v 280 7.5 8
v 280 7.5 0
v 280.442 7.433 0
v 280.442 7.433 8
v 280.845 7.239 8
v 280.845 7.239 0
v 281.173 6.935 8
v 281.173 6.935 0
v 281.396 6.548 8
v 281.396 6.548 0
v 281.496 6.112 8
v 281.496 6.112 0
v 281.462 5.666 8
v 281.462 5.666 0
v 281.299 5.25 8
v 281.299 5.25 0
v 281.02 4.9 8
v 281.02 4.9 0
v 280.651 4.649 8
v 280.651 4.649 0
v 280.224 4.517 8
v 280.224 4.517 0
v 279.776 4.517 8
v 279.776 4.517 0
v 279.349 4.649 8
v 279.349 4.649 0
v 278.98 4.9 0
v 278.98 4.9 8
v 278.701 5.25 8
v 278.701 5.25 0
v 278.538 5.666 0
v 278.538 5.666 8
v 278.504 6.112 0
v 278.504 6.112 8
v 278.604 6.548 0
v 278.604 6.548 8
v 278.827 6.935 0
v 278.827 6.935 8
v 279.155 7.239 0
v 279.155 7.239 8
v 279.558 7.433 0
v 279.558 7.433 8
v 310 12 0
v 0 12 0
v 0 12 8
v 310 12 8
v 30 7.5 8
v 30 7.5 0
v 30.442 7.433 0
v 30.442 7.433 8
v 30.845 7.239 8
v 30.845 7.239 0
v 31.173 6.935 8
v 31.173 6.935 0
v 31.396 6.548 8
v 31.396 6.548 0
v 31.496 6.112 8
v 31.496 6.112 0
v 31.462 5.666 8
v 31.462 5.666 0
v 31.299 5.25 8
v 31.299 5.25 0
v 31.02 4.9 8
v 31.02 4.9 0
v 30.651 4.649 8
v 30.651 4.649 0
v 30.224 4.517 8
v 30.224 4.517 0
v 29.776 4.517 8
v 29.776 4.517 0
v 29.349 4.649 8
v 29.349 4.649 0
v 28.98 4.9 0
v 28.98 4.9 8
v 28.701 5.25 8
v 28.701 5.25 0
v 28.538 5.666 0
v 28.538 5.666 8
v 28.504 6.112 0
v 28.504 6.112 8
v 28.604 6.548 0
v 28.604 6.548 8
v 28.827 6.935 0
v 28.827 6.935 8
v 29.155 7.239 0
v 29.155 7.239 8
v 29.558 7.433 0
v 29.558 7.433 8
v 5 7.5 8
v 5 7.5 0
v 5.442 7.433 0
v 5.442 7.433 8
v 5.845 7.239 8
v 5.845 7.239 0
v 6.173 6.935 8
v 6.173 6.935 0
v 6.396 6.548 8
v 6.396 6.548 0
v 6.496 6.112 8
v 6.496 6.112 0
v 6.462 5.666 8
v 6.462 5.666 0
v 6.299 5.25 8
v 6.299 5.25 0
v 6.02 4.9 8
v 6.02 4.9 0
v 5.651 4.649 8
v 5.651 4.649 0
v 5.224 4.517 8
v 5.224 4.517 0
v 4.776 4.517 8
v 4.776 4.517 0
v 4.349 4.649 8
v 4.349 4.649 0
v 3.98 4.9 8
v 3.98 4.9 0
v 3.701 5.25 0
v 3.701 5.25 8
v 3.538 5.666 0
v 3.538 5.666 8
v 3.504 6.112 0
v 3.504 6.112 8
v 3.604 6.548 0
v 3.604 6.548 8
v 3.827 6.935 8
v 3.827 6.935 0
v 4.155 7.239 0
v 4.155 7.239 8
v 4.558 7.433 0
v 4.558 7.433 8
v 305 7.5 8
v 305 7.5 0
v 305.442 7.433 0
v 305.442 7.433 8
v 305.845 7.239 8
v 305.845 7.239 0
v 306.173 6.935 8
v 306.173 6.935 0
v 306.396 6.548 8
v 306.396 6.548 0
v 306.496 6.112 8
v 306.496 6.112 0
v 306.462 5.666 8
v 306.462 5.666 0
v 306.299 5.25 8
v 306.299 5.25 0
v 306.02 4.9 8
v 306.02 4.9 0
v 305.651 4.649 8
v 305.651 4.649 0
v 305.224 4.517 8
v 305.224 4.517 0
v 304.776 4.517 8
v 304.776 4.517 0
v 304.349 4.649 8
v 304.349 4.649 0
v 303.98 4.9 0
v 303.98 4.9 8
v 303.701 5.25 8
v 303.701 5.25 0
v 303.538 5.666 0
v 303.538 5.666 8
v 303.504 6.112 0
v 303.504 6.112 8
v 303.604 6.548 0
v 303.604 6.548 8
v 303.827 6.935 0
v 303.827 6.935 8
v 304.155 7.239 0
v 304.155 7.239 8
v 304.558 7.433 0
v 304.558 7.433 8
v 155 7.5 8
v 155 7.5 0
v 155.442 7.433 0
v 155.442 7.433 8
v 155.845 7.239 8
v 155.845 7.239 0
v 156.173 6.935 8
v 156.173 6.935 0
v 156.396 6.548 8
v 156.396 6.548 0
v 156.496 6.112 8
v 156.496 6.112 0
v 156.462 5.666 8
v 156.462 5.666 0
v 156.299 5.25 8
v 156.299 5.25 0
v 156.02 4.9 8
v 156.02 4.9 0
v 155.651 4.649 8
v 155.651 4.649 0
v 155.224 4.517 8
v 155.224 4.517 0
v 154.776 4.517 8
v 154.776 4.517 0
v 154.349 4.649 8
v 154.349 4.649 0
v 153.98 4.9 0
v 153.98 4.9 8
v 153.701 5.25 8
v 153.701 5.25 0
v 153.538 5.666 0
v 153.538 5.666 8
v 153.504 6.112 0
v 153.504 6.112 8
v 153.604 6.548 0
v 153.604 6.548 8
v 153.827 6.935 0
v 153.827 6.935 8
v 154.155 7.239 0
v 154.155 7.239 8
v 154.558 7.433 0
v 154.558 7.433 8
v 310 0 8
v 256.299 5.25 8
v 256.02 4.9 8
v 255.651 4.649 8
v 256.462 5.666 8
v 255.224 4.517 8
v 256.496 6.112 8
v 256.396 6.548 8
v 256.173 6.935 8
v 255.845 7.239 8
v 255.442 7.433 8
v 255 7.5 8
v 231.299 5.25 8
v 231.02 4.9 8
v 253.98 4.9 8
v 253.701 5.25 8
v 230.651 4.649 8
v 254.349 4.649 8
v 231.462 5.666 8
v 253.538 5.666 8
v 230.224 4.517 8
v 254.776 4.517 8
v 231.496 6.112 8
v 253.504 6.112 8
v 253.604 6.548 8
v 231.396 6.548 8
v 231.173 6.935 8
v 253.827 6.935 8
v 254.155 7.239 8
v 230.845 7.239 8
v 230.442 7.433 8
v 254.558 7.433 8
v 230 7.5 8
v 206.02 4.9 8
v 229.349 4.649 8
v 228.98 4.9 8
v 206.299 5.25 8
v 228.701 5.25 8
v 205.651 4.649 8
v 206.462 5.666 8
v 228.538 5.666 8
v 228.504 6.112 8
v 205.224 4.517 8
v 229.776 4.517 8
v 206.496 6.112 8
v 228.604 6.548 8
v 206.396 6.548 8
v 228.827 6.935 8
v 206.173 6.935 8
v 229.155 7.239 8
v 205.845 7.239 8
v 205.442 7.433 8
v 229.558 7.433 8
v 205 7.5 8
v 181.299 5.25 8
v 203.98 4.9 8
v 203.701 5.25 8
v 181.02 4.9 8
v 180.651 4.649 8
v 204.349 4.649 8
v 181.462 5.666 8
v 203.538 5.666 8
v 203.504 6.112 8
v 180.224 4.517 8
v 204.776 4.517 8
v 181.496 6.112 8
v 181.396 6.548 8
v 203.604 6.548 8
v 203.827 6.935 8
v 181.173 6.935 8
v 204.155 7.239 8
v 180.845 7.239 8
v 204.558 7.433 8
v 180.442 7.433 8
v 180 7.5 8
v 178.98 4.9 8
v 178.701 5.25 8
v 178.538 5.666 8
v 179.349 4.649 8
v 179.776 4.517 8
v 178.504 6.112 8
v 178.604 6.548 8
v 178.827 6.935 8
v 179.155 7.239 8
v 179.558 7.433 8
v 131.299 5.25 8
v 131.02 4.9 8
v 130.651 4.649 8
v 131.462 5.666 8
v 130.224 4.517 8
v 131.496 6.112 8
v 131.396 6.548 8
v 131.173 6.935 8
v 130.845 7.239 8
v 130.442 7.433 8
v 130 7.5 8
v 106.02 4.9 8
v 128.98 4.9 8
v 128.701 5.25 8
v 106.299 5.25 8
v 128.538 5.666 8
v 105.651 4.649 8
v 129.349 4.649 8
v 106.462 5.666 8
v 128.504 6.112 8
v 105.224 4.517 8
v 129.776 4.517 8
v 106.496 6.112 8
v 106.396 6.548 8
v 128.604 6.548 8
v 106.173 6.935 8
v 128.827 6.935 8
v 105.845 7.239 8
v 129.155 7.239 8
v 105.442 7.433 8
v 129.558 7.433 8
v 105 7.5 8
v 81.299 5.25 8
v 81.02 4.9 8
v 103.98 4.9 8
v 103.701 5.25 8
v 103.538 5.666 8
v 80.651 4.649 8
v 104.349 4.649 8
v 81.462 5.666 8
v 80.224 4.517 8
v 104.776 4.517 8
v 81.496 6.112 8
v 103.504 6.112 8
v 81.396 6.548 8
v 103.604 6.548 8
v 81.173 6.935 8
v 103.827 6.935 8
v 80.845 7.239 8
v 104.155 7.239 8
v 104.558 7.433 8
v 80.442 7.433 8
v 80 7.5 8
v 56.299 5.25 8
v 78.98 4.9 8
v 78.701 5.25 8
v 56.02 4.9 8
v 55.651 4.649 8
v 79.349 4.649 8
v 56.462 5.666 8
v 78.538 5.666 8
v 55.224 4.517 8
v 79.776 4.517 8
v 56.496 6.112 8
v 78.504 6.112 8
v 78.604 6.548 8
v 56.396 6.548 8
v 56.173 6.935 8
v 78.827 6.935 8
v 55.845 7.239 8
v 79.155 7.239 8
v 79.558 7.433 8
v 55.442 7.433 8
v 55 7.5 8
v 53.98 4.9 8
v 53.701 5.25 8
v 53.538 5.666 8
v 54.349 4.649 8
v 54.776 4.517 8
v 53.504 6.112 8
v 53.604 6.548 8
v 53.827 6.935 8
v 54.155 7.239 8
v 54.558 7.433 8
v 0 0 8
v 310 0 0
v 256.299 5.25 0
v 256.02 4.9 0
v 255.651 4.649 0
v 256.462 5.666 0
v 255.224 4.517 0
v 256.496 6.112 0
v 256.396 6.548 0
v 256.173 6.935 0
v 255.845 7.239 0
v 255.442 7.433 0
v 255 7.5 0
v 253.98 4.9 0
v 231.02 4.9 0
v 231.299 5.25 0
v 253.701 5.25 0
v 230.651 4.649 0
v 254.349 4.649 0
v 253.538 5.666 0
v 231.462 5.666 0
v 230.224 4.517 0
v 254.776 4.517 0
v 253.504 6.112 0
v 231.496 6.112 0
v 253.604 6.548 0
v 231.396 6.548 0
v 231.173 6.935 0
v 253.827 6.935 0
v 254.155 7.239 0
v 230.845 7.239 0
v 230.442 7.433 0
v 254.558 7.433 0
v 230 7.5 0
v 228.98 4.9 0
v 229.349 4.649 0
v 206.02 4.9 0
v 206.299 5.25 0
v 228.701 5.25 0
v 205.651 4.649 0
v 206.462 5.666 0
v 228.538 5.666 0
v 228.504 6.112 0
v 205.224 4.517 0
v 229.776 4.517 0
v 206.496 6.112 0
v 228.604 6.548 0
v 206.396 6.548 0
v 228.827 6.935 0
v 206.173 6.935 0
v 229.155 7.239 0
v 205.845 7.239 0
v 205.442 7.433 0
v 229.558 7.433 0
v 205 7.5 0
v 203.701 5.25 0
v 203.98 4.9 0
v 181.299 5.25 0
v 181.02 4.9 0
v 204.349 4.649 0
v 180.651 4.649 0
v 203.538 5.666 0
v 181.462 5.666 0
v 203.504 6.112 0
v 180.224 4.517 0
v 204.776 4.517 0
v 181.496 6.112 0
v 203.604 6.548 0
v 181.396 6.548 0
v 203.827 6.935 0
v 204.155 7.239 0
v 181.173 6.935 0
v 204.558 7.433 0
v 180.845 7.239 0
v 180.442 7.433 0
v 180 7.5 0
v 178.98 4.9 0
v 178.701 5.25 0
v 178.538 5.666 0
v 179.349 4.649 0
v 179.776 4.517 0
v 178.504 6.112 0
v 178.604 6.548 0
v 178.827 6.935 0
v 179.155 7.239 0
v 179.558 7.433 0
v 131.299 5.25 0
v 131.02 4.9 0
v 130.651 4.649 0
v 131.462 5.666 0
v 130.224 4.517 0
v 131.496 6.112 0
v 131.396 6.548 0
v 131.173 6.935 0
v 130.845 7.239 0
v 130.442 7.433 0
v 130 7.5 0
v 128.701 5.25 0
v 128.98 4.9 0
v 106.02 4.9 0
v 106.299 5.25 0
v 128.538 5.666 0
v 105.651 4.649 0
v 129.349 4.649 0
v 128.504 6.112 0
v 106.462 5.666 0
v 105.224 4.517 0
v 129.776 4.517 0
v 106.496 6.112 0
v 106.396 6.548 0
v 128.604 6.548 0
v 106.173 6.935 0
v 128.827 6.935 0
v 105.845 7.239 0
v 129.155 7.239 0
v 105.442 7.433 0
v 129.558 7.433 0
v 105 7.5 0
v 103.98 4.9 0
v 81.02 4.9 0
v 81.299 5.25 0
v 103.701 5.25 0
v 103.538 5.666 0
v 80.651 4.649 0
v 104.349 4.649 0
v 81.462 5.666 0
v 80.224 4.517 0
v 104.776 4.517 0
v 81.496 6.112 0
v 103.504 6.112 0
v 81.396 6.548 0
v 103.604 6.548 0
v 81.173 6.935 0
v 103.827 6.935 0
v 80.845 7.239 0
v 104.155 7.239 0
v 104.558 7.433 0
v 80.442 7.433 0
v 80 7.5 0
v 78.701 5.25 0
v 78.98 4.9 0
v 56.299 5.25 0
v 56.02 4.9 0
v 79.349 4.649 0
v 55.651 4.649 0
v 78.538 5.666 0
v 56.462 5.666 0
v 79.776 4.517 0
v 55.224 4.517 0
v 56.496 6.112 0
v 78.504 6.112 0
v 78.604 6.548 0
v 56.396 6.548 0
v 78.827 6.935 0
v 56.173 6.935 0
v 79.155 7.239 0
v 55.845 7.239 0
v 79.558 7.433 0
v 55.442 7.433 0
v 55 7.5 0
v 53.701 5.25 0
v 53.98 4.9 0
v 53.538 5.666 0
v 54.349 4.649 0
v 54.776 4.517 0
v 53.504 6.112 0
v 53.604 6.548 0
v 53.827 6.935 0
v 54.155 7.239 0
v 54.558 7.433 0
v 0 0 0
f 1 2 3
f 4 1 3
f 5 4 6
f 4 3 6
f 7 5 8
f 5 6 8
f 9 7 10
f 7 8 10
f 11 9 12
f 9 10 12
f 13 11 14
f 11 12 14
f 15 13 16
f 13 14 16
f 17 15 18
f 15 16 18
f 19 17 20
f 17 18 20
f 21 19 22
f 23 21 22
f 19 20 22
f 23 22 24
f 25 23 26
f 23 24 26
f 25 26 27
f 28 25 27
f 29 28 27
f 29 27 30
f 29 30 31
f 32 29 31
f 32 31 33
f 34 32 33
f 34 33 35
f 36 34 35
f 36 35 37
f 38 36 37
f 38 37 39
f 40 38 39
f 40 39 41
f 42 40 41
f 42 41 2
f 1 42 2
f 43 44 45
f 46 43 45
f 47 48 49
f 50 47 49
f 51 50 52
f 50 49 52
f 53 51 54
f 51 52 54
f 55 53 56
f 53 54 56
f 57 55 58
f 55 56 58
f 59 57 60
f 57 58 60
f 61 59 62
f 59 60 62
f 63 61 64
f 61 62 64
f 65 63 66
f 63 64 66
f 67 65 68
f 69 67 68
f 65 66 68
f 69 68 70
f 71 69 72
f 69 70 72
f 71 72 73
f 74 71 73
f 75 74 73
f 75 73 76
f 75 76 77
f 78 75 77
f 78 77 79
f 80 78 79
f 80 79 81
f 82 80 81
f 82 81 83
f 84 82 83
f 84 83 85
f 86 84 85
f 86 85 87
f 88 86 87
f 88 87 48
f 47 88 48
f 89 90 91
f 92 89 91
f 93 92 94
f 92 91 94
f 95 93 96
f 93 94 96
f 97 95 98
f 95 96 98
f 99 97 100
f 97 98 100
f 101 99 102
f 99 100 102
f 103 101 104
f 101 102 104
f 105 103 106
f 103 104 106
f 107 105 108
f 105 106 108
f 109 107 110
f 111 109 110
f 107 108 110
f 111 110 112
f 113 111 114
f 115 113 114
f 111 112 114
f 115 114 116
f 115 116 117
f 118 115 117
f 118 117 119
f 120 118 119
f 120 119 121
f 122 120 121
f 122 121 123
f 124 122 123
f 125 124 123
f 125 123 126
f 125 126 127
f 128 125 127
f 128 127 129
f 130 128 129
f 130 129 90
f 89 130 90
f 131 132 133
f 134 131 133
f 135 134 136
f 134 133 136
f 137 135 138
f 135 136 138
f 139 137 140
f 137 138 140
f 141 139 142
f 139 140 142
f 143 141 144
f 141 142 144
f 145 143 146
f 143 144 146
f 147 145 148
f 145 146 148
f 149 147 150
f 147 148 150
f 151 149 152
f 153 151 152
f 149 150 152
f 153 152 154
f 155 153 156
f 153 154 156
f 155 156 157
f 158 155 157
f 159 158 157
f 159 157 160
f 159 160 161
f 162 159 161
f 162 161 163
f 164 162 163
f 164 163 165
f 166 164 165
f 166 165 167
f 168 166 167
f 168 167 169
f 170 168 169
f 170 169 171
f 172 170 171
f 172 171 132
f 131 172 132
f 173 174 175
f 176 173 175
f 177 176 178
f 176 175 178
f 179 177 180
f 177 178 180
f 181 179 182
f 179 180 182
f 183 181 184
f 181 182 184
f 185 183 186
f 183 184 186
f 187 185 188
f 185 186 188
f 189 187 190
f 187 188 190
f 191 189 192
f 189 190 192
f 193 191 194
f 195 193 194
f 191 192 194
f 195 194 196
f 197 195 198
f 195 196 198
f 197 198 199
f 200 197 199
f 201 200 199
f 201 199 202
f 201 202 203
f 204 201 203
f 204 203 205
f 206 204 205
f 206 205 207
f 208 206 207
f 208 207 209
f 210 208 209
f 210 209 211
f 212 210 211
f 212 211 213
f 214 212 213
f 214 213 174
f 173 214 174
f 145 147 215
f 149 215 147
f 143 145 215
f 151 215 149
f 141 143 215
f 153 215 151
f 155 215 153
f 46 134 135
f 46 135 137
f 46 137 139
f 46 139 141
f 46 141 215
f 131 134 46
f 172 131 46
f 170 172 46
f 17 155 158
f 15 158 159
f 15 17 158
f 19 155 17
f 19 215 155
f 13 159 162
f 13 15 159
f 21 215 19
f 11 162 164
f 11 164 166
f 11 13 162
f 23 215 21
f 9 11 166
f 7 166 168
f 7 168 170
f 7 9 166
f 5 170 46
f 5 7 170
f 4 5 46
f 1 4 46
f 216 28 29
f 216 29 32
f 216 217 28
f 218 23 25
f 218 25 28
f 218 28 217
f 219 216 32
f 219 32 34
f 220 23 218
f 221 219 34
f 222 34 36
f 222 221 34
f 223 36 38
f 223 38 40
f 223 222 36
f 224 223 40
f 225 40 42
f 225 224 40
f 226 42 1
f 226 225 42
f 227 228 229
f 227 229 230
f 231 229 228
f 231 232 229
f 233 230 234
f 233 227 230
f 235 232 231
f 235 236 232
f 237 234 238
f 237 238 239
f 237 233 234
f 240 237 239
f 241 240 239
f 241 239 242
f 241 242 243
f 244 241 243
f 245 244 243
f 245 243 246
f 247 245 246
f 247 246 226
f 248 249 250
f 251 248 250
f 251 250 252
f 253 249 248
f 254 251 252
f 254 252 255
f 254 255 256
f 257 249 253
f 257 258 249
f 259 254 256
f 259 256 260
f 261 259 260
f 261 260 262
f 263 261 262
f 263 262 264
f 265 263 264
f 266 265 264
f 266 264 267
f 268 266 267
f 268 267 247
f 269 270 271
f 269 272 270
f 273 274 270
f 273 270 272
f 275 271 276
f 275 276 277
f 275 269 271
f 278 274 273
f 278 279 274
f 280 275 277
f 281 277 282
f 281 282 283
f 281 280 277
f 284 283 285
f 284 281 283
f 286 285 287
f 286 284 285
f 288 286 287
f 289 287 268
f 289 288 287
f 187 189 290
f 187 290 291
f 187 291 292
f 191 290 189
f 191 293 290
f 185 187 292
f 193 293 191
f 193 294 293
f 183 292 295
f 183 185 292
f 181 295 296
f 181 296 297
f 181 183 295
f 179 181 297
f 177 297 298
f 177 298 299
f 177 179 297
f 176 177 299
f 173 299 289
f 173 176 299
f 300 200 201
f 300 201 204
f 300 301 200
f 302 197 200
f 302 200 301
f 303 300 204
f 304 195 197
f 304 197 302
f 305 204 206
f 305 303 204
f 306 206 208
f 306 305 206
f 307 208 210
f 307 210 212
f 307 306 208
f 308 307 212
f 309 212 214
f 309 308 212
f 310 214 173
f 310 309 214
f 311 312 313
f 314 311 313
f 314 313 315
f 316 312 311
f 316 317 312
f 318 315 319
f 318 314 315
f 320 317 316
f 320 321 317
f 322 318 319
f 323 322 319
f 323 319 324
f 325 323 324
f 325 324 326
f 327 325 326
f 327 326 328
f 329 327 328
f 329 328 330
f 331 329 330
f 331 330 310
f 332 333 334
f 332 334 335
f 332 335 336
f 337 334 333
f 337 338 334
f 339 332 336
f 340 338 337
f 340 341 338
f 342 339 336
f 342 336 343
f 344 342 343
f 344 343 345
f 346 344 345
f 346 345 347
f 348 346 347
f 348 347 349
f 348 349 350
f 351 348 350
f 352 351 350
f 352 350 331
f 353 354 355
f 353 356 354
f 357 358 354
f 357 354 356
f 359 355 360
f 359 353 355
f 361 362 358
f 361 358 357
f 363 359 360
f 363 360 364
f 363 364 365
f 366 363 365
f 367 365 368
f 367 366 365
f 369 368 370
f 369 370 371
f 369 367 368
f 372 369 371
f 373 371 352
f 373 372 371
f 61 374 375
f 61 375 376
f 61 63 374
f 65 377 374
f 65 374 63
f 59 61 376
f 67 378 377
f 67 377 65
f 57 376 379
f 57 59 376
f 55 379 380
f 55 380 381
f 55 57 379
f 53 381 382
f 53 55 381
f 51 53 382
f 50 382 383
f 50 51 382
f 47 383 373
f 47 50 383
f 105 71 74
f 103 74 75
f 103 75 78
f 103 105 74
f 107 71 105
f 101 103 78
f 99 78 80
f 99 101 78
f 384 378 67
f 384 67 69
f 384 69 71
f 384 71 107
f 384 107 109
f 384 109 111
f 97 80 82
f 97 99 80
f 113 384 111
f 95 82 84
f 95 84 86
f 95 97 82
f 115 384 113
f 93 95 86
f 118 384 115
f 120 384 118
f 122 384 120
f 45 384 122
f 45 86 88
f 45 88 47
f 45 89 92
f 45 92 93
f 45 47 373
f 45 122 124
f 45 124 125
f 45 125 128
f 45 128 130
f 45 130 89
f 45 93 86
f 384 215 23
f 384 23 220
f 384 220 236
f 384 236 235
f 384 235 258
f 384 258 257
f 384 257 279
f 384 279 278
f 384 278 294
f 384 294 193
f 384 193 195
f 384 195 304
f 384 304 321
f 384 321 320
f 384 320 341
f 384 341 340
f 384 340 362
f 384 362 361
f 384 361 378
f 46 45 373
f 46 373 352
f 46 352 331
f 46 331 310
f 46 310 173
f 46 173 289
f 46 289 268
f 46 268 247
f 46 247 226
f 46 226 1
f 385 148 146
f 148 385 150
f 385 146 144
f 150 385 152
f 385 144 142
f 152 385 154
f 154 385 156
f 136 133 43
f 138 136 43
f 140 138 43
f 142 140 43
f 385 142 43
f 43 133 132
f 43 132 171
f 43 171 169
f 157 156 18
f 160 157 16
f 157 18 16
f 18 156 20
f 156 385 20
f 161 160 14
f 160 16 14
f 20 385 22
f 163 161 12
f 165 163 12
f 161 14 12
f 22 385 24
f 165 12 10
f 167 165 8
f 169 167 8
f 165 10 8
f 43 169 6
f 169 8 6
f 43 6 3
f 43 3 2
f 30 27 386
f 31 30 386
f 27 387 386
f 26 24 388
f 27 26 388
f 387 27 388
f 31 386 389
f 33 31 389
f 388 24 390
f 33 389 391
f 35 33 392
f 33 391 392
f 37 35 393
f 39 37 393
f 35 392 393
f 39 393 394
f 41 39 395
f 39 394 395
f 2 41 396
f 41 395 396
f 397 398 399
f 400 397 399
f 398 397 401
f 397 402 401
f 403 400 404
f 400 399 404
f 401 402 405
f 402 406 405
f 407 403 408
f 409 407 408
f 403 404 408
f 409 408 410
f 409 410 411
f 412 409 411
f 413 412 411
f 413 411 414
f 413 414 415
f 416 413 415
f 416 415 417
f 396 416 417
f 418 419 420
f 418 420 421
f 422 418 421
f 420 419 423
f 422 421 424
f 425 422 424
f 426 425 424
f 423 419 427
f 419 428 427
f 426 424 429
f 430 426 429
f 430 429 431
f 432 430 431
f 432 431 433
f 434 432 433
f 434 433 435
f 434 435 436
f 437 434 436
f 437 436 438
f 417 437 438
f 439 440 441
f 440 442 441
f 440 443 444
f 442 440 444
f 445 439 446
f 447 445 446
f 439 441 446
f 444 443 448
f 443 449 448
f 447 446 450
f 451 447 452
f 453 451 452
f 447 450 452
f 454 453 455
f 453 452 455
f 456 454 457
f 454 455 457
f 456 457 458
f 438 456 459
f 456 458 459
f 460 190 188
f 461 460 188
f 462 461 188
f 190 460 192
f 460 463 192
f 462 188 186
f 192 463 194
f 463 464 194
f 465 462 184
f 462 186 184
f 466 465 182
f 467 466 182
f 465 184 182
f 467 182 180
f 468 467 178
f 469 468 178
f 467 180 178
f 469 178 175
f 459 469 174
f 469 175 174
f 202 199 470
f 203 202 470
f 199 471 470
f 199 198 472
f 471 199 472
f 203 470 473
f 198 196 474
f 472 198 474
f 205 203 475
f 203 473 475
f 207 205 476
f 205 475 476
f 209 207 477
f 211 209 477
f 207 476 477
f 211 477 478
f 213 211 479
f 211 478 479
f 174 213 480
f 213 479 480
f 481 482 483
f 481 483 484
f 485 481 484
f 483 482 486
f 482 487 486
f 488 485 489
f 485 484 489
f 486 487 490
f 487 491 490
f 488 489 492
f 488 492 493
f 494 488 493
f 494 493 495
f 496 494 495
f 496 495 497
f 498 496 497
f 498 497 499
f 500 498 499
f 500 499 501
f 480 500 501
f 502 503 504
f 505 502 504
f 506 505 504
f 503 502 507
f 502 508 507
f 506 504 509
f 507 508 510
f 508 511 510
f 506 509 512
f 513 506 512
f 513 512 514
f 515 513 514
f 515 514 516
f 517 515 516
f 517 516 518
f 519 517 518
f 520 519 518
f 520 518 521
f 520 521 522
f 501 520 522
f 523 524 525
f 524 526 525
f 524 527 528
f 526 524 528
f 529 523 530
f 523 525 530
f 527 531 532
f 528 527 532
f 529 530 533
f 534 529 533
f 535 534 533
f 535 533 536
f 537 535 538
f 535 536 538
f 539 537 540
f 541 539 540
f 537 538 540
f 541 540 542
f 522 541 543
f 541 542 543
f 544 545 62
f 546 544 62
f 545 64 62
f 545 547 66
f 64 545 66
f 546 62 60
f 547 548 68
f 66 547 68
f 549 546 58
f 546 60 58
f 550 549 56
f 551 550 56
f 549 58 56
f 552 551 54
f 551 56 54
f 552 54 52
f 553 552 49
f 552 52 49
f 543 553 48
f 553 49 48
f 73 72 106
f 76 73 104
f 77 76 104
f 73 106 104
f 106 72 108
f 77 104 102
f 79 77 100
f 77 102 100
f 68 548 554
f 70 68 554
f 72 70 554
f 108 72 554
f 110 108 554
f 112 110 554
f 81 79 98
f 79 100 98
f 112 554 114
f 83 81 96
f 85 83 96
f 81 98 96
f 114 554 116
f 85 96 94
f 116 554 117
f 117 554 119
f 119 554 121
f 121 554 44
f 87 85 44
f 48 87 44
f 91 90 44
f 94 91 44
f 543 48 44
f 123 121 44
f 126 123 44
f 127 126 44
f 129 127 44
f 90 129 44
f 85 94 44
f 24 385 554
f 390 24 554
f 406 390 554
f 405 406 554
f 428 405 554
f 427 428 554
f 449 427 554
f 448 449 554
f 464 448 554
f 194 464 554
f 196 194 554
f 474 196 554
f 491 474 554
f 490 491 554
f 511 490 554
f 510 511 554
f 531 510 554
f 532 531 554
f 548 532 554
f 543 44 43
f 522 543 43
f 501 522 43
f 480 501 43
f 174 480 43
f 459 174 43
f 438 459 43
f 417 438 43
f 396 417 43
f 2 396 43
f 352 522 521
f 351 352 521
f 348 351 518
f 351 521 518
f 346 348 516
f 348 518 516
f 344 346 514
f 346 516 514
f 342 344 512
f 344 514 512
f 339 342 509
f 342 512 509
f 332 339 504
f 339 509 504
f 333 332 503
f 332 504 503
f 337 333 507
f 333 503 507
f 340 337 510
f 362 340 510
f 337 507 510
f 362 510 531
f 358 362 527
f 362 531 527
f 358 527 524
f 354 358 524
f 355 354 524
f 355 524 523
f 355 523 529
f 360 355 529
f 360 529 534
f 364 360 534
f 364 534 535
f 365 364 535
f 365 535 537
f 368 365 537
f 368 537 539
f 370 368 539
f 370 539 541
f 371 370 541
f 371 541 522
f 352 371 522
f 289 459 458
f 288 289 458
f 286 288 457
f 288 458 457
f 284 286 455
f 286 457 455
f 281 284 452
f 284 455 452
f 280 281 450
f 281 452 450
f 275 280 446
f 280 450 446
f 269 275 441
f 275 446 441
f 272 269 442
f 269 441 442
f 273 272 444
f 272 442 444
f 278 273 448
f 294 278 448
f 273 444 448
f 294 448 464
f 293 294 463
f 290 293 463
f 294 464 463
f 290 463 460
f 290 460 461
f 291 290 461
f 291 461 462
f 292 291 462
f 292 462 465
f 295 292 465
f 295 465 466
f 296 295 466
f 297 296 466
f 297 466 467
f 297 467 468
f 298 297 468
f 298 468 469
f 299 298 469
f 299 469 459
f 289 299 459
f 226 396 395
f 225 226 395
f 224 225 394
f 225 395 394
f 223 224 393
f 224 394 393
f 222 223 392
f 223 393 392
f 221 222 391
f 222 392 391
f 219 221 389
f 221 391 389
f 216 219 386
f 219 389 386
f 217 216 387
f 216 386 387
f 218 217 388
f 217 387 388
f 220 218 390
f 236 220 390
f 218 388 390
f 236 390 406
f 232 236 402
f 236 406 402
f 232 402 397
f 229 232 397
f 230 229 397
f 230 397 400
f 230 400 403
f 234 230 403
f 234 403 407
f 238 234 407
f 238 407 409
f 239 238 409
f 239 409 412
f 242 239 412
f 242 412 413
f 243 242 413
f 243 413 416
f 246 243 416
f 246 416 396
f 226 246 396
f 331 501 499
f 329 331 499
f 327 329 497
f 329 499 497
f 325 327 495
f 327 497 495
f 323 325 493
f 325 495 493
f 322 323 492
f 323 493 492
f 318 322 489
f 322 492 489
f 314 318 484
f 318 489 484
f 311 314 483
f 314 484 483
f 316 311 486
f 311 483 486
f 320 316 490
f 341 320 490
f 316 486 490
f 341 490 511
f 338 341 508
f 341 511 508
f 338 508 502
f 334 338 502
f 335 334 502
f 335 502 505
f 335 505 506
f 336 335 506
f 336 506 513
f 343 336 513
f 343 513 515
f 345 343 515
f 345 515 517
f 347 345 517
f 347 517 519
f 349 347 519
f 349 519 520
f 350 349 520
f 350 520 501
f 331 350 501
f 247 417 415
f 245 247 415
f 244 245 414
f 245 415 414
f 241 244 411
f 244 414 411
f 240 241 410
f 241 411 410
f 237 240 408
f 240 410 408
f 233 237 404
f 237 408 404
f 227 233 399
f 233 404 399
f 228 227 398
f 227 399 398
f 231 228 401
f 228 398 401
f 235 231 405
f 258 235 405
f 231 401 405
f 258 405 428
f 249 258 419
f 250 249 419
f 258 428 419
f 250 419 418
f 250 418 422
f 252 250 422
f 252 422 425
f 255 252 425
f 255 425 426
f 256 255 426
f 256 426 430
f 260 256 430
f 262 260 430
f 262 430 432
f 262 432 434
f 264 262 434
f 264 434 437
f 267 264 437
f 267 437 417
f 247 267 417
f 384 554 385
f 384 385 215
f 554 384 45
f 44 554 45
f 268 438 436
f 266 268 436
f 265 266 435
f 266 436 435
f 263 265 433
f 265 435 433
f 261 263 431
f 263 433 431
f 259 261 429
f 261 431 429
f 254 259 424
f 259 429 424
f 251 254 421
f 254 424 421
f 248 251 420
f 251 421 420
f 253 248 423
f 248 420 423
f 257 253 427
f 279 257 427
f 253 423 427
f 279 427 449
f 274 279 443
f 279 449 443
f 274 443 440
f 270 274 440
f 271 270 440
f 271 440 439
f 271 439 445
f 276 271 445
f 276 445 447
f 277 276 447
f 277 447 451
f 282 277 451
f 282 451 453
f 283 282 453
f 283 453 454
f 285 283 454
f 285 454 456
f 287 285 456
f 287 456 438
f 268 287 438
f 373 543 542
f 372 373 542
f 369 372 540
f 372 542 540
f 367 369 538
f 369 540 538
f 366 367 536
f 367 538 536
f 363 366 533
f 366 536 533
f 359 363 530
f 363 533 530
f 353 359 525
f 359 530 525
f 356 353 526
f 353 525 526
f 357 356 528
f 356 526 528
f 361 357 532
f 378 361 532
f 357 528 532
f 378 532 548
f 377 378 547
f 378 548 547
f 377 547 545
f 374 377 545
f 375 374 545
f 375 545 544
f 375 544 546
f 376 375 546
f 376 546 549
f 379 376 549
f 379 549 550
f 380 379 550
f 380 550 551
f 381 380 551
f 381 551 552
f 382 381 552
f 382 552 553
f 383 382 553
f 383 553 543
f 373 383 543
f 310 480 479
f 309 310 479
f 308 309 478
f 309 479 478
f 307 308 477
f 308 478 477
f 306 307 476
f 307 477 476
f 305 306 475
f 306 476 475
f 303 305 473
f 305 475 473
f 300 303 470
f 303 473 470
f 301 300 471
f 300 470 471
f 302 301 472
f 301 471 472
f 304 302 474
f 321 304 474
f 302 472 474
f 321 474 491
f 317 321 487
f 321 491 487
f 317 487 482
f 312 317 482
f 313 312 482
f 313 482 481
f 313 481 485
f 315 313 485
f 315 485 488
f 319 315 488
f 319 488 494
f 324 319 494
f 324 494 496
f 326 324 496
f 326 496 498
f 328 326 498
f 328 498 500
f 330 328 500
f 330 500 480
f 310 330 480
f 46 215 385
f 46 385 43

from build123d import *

# Parameters (mm, degrees)
SKETCH_W             = 12
SKETCH_H             = 8
PAD_DEPTH            = 310
SKETCH001_R          = 1.5
POCKET_DEPTH         = 8.001
LINEARPATTERN_COUNT  = 13
LINEARPATTERN_PITCH  = 25
BODY_ROLL_ANGLE      = 90
BODY_PLACEMENT_ANGLE = 90


with BuildPart() as part:
    # Sketch → Pad (new body)
    with BuildSketch(Plane.XY):
        Rectangle(SKETCH_W, SKETCH_H)
    extrude(amount=PAD_DEPTH)

    # Sketch001 (on Face3 of Pad) → Pocket (cut, through all)
    with BuildSketch(Plane.XZ.offset(4)):
        with Locations((0, 305)):
            Circle(SKETCH001_R)
    pocket = extrude(amount=-POCKET_DEPTH, mode=Mode.SUBTRACT)

    # LinearPattern: Pocket ×13
    with Locations(*[(0, 0, -i * LINEARPATTERN_PITCH) for i in range(1, LINEARPATTERN_COUNT)]):
        add(pocket, mode=Mode.SUBTRACT)


with BuildPart() as part_1:
    # Body roll: moved
    add(part.part.rotate(Axis((0, 0, 0), (1, 0, 0)), BODY_ROLL_ANGLE))


with BuildPart() as part_2:
    # Body placement: moved
    add(part_1.part.moved(Location((0, 6, 4))).rotate(Axis((0, 6, 4), (0, 0, 1)), BODY_PLACEMENT_ANGLE))


solid = part_2.part
